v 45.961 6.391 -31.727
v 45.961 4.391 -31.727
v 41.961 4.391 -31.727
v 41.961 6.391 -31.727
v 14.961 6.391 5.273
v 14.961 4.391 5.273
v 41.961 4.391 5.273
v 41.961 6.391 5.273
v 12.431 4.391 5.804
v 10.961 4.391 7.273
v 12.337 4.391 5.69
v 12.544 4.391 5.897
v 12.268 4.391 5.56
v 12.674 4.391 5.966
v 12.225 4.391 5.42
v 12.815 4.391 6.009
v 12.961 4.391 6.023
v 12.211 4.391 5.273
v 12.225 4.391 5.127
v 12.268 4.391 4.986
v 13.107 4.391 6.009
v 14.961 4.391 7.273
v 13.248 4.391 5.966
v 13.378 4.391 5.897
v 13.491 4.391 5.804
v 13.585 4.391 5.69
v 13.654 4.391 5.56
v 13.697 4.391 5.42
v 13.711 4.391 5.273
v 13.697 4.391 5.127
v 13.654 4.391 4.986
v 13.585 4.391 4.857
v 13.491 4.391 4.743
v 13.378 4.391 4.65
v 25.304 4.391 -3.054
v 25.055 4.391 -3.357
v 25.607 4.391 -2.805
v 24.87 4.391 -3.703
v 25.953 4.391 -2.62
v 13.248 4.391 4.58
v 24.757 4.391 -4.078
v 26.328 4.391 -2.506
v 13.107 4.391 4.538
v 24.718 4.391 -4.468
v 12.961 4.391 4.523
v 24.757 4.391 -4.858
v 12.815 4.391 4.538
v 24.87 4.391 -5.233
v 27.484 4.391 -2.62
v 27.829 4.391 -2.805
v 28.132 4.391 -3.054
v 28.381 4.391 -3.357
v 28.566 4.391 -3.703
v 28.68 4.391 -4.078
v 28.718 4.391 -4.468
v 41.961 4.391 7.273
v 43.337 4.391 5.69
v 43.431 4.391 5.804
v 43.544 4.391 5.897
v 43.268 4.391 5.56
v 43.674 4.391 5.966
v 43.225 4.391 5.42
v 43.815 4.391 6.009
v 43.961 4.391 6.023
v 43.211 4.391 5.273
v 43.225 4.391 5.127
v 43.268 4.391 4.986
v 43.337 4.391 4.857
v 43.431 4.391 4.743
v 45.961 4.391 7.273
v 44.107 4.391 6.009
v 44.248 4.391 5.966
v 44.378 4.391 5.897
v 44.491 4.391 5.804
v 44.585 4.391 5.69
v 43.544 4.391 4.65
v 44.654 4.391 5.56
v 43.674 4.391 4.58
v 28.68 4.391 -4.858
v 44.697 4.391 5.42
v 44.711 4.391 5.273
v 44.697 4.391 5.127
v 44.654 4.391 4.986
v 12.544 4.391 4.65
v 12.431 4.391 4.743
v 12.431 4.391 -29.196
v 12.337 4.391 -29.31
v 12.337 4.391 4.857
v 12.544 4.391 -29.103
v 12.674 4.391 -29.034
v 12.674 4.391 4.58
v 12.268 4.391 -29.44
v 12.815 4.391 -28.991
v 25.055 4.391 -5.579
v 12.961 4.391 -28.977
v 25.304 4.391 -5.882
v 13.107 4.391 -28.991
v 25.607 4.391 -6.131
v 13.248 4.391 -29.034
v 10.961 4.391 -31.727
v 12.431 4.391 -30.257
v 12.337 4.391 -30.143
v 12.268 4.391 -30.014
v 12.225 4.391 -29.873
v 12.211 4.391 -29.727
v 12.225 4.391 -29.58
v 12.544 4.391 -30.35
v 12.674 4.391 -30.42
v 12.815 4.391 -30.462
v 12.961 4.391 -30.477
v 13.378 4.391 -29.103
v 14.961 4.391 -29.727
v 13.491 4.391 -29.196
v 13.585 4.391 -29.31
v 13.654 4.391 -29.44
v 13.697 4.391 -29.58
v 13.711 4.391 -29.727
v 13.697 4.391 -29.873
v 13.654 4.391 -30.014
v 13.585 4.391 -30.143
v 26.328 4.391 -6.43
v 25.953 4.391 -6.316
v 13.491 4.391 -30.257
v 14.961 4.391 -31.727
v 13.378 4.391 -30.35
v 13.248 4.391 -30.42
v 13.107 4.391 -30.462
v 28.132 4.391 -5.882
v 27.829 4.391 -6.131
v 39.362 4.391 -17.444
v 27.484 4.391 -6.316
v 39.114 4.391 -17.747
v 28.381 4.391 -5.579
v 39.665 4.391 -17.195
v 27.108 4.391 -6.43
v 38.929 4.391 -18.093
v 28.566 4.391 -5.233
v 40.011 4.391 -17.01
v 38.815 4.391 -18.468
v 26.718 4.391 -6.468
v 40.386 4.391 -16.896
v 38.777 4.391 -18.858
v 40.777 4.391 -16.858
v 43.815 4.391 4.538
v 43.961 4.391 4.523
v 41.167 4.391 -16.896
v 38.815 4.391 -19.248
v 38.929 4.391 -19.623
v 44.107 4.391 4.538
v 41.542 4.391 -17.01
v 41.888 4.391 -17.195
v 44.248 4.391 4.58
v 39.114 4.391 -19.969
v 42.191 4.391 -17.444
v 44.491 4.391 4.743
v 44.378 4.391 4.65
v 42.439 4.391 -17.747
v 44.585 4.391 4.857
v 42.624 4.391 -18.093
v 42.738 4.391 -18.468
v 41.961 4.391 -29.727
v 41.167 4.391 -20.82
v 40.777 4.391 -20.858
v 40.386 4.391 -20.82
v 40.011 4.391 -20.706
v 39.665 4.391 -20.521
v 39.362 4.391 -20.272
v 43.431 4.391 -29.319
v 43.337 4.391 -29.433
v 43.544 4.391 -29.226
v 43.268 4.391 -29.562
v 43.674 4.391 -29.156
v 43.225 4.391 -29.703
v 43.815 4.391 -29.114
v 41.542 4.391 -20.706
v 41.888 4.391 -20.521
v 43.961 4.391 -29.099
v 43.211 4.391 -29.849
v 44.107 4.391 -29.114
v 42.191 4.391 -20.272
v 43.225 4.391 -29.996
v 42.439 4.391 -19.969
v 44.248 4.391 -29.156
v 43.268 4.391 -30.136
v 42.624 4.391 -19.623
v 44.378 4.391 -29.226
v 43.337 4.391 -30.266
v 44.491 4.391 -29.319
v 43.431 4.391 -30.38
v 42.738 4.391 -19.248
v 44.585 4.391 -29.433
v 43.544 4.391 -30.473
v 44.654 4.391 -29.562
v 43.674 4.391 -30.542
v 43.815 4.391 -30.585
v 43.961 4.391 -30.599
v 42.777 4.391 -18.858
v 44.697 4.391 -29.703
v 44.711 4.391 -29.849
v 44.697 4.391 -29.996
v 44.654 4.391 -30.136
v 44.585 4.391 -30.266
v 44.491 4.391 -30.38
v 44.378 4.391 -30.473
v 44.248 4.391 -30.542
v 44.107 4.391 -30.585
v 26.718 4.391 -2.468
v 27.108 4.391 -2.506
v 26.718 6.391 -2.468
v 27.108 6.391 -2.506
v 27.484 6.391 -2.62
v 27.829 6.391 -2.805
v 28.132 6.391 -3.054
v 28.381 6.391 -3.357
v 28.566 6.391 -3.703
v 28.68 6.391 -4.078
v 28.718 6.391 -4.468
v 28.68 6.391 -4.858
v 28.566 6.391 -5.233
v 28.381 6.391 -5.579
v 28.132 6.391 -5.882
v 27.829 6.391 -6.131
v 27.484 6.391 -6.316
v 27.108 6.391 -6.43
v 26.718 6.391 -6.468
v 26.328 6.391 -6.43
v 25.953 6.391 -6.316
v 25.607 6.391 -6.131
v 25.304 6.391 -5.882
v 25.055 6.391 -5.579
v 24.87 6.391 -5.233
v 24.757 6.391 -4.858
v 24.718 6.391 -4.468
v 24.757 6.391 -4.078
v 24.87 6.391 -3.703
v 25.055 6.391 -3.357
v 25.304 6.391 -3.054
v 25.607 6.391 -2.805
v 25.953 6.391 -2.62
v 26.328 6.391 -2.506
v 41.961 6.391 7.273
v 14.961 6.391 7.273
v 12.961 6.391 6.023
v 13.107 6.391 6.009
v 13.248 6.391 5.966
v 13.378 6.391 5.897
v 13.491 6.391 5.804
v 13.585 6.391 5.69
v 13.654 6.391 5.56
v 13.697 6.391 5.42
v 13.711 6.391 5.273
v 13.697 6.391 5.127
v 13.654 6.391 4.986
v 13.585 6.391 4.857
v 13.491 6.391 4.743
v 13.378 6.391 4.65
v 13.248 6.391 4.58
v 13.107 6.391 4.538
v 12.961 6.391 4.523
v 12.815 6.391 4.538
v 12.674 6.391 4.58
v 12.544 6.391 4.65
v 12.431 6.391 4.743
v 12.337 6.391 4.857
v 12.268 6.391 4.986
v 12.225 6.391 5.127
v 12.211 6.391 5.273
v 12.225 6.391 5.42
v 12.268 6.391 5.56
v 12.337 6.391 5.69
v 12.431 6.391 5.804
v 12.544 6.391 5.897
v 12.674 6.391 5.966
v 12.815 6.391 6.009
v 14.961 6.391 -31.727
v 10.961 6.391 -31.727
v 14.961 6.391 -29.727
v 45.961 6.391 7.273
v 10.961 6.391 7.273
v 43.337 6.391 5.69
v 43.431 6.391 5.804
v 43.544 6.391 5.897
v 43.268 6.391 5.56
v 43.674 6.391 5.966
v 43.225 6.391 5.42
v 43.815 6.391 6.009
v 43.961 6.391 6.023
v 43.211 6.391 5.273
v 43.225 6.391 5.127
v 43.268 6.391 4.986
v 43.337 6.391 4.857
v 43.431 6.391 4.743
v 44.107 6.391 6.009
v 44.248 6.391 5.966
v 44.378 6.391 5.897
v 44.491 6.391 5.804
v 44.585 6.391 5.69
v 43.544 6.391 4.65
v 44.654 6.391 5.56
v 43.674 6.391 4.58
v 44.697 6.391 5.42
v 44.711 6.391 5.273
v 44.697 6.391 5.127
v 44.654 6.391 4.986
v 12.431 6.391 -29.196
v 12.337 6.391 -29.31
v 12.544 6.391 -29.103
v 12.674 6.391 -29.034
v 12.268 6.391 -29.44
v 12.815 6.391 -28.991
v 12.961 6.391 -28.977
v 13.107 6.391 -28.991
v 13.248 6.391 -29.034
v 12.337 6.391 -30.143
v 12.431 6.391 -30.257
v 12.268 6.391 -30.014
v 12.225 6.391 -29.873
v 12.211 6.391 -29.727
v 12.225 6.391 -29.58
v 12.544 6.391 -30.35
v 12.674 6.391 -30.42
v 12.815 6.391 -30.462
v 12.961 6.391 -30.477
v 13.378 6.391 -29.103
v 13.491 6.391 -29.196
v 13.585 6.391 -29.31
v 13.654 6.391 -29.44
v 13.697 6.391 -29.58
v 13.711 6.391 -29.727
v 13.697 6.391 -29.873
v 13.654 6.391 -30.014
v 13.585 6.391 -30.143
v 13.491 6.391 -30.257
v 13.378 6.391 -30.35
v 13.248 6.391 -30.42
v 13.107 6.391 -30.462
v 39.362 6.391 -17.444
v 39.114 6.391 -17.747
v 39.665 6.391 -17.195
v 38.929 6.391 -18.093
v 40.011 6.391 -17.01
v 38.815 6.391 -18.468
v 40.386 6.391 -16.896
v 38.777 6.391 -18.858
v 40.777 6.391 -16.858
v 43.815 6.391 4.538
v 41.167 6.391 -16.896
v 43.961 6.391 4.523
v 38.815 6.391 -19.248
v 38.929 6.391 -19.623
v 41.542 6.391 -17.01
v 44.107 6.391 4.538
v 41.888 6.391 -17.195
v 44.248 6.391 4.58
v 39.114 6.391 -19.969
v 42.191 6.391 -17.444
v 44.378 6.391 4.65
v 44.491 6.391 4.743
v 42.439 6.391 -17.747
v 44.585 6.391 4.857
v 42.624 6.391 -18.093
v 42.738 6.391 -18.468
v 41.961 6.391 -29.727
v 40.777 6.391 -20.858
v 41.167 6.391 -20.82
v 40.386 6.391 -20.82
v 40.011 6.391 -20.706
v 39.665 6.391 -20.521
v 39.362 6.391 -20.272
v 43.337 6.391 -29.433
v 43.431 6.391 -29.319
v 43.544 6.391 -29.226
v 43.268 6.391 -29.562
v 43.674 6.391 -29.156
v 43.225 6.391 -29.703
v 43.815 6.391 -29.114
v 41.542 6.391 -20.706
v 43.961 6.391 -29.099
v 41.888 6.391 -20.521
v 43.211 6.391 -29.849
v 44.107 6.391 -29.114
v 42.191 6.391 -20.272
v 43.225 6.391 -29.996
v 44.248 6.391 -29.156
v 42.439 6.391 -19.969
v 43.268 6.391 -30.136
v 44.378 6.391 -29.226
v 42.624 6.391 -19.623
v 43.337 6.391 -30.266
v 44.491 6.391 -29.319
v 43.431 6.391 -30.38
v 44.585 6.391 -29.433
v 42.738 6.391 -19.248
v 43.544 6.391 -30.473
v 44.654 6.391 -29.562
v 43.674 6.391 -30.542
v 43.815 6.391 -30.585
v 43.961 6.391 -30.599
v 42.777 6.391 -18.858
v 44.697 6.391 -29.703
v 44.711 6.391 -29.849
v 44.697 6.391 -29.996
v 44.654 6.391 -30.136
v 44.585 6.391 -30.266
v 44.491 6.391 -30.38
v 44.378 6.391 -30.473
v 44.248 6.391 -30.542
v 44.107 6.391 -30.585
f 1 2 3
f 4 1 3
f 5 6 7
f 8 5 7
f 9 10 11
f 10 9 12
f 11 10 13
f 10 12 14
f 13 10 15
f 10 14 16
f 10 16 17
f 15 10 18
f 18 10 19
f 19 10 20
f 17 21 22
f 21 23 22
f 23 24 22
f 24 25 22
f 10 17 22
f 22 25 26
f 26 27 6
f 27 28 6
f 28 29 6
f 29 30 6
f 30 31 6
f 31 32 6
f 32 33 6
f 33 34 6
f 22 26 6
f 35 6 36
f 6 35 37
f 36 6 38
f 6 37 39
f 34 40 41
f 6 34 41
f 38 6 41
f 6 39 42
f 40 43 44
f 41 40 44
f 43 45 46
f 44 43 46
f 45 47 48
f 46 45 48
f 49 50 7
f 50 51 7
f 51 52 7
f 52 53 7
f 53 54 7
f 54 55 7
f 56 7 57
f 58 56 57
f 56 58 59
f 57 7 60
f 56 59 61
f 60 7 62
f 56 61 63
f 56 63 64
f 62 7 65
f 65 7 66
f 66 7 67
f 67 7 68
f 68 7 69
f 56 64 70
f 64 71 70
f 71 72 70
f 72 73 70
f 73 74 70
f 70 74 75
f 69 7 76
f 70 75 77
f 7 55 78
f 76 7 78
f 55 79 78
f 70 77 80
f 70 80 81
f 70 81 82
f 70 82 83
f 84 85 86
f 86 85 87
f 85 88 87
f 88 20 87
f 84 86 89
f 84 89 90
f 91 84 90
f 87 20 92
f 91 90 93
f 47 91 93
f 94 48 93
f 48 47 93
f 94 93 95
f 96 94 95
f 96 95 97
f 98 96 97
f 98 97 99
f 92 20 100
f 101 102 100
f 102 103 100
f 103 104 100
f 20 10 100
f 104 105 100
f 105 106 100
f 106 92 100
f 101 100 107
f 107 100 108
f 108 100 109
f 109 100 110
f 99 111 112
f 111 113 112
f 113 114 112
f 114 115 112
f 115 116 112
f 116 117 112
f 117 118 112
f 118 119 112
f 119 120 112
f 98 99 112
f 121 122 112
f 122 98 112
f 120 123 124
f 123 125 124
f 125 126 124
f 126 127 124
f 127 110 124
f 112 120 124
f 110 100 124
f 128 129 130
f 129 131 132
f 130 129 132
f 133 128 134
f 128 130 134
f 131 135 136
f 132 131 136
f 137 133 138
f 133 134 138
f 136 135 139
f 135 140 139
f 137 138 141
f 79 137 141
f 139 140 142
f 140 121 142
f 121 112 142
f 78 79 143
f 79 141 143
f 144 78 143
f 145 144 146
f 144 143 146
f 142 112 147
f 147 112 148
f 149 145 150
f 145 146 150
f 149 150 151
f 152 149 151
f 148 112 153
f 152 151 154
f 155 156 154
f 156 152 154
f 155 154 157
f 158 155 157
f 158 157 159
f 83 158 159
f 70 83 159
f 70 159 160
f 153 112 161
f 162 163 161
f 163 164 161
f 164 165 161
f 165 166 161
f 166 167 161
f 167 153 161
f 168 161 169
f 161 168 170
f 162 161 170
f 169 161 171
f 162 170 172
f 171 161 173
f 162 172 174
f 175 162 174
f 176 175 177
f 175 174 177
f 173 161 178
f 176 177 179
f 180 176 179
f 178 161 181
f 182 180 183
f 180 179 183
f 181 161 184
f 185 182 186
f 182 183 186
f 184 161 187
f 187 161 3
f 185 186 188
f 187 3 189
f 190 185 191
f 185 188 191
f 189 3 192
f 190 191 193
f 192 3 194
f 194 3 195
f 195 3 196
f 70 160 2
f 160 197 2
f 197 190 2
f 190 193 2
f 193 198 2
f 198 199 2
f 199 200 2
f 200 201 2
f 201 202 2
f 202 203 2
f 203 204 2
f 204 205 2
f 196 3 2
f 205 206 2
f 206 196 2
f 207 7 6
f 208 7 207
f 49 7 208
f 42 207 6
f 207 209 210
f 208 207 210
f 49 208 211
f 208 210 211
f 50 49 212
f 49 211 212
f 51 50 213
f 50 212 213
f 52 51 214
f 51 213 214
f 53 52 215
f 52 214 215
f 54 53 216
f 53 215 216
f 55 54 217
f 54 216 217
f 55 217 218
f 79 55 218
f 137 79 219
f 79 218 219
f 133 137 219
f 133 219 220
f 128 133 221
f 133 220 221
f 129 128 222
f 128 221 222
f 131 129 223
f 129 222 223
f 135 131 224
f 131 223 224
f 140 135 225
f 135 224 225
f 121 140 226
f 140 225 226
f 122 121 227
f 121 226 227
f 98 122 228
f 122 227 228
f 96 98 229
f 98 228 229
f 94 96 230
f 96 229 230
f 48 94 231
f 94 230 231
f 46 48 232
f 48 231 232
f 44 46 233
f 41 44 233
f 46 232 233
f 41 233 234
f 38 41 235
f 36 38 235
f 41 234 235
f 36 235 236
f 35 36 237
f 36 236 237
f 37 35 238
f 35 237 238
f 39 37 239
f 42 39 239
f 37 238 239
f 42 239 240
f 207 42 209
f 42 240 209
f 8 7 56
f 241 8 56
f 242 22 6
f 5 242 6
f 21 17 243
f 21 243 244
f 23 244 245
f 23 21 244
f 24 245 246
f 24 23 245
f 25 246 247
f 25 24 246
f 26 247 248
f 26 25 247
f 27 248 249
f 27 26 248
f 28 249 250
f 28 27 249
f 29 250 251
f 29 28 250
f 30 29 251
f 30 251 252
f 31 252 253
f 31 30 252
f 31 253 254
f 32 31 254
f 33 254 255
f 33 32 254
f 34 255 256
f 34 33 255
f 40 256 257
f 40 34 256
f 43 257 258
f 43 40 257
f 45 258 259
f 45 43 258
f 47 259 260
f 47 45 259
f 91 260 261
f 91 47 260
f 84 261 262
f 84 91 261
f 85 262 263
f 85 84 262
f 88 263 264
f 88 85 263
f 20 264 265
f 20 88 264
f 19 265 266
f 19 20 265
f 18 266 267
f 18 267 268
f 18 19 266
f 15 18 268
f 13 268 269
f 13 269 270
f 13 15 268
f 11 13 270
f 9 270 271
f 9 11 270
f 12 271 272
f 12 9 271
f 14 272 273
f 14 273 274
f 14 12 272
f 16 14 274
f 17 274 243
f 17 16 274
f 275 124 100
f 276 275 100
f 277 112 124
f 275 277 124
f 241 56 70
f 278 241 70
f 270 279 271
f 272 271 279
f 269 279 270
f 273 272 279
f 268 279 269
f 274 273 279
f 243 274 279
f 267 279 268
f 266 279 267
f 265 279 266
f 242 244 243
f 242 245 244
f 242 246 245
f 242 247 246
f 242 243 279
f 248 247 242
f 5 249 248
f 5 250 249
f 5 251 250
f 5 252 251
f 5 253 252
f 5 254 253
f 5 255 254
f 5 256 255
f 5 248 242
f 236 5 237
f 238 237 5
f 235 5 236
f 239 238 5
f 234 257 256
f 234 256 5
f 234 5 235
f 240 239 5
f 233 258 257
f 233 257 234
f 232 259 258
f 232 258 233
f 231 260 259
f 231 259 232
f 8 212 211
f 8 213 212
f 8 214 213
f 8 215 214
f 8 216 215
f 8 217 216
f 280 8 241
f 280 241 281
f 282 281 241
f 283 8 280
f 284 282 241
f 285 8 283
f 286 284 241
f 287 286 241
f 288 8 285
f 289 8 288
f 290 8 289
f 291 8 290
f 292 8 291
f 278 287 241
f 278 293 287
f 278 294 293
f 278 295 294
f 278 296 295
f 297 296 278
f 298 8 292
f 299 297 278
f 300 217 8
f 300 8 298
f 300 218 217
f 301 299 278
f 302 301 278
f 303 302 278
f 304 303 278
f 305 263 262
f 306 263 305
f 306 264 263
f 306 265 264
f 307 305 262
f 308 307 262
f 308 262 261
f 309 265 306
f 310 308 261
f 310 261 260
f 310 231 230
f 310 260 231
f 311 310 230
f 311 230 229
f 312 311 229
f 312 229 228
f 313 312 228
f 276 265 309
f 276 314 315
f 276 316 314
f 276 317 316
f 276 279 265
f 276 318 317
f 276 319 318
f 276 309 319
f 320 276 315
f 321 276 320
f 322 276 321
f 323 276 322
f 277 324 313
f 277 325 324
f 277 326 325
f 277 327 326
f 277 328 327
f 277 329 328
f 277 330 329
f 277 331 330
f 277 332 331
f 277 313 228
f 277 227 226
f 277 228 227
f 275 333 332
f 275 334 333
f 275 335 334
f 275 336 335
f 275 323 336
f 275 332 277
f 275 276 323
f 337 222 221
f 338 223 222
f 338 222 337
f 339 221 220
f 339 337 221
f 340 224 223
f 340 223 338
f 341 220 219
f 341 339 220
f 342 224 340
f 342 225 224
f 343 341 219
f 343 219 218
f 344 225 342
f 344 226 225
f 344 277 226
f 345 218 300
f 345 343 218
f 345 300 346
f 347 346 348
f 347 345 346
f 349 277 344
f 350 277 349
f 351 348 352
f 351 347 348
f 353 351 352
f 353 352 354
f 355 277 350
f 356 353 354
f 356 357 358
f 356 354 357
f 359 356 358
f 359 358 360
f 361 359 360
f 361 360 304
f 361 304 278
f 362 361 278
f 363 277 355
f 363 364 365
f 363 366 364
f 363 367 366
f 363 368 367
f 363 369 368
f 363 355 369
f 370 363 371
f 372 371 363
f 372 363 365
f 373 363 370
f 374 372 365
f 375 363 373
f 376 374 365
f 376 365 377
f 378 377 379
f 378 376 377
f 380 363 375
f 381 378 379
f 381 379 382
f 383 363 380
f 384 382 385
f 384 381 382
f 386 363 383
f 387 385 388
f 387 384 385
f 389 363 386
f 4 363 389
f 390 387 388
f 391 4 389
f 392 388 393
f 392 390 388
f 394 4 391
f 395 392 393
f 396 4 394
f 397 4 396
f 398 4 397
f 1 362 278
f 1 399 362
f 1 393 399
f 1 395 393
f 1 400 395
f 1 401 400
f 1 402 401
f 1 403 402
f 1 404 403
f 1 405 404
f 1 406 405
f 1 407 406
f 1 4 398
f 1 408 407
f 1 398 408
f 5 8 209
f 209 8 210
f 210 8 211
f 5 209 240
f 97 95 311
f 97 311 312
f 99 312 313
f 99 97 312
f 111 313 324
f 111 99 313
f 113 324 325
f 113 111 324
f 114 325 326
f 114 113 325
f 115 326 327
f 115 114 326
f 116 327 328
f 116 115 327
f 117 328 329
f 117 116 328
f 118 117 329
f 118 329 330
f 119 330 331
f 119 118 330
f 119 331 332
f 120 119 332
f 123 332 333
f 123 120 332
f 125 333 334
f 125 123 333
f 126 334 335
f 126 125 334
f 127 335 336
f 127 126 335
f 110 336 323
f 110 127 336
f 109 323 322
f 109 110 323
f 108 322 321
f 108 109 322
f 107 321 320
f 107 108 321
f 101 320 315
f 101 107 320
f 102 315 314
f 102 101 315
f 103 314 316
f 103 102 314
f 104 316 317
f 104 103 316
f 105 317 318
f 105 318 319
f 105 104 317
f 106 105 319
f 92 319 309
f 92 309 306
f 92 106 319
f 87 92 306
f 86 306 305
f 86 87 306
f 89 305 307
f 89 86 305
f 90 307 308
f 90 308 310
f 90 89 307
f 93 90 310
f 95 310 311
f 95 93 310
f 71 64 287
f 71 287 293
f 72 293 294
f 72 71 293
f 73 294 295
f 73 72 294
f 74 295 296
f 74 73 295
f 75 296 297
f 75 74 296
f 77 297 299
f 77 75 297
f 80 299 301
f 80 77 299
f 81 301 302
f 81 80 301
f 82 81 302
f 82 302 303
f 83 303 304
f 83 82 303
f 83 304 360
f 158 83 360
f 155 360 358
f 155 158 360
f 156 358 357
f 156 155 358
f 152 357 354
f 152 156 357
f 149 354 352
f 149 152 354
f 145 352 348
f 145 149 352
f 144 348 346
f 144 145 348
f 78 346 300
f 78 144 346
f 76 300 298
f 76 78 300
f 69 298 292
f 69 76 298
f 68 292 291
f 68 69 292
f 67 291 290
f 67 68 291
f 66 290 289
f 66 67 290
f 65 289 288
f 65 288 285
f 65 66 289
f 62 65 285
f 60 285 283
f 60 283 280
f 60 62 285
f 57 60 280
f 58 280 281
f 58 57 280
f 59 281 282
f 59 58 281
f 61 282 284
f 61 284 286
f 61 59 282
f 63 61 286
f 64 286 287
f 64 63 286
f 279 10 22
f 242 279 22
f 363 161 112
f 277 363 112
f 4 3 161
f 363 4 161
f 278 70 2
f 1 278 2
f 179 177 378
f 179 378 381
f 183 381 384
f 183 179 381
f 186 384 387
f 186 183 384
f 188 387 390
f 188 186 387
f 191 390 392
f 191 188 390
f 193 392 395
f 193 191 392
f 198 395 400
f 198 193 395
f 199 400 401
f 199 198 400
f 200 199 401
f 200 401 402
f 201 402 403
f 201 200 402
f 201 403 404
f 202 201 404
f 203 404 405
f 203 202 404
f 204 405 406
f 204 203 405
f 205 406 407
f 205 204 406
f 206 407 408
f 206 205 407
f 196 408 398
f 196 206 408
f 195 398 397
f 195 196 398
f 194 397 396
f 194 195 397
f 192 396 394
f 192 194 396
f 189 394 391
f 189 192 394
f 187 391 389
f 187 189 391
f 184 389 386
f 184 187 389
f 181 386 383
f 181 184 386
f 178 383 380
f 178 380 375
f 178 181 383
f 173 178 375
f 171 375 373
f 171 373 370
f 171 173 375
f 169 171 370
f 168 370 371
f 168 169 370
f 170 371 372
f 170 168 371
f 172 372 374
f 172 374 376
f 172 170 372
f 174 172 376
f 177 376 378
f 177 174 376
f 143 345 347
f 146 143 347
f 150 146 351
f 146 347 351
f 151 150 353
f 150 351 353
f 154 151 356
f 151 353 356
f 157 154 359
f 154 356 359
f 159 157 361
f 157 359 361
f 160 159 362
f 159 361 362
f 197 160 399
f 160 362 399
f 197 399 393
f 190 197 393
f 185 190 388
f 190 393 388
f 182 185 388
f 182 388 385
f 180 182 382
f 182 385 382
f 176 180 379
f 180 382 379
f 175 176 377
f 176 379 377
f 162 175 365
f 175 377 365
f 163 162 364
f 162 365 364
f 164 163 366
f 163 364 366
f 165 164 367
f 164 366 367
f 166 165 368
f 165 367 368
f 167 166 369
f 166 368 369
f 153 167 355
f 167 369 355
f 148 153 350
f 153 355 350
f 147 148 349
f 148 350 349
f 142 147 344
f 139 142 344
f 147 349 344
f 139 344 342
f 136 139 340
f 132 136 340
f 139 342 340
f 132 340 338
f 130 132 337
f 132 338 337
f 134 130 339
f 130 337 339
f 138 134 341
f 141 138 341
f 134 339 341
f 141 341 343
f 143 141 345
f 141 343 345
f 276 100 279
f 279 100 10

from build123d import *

# Parameters (mm, degrees)
SKETCH1_R           = 0.75
BOSS_EXTRUDE1_DEPTH = 2
SKETCH2_R           = 2
CUT_EXTRUDE1_DEPTH  = 2


with BuildPart() as part:
    # Sketch1 → Boss-Extrude1 (new body)
    with BuildSketch(Plane(origin=(0, 4.390610578, 0), x_dir=(1, 0, 0), z_dir=(0, 1, 0))):
        Polygon((10.961043754, 31.726646364), (10.961043754, -7.273353636), (14.961043754, -7.273353636), (14.961043754, -5.273353636), (41.961043754, -5.273353636), (41.961043754, -7.273353636), (45.961043754, -7.273353636), (45.961043754, 31.726646364), (41.961043754, 31.726646364), (41.961043754, 29.726646364), (14.961043754, 29.726646364), (14.961043754, 31.726646364), align=None)
        with Locations(Location((12.961043754, -5.273353636, 0), (0, 0, 270))):
            Circle(SKETCH1_R, mode=Mode.SUBTRACT)
        with Locations(Location((43.961043754, -5.273353636, 0), (0, 0, 270))):
            Circle(SKETCH1_R, mode=Mode.SUBTRACT)
        with Locations(Location((43.961043754, 29.849185289, 0), (0, 0, 270))):
            Circle(SKETCH1_R, mode=Mode.SUBTRACT)
        with Locations(Location((12.961043754, 29.726646364, 0), (0, 0, 270))):
            Circle(SKETCH1_R, mode=Mode.SUBTRACT)
    extrude(amount=BOSS_EXTRUDE1_DEPTH)

    # Sketch2 → Cut-Extrude1 (cut)
    with BuildSketch(Plane(origin=(0, 6.390610578, 0), x_dir=(1, 0, 0), z_dir=(0, 1, 0))):
        with Locations(Location((26.718170314, 4.468036121, 0), (0, 0, 270))):
            Circle(SKETCH2_R)
        with Locations(Location((40.776506823, 18.857937171, 0), (0, 0, 270))):
            Circle(SKETCH2_R)
    extrude(amount=-CUT_EXTRUDE1_DEPTH, mode=Mode.SUBTRACT)


solid = part.part
